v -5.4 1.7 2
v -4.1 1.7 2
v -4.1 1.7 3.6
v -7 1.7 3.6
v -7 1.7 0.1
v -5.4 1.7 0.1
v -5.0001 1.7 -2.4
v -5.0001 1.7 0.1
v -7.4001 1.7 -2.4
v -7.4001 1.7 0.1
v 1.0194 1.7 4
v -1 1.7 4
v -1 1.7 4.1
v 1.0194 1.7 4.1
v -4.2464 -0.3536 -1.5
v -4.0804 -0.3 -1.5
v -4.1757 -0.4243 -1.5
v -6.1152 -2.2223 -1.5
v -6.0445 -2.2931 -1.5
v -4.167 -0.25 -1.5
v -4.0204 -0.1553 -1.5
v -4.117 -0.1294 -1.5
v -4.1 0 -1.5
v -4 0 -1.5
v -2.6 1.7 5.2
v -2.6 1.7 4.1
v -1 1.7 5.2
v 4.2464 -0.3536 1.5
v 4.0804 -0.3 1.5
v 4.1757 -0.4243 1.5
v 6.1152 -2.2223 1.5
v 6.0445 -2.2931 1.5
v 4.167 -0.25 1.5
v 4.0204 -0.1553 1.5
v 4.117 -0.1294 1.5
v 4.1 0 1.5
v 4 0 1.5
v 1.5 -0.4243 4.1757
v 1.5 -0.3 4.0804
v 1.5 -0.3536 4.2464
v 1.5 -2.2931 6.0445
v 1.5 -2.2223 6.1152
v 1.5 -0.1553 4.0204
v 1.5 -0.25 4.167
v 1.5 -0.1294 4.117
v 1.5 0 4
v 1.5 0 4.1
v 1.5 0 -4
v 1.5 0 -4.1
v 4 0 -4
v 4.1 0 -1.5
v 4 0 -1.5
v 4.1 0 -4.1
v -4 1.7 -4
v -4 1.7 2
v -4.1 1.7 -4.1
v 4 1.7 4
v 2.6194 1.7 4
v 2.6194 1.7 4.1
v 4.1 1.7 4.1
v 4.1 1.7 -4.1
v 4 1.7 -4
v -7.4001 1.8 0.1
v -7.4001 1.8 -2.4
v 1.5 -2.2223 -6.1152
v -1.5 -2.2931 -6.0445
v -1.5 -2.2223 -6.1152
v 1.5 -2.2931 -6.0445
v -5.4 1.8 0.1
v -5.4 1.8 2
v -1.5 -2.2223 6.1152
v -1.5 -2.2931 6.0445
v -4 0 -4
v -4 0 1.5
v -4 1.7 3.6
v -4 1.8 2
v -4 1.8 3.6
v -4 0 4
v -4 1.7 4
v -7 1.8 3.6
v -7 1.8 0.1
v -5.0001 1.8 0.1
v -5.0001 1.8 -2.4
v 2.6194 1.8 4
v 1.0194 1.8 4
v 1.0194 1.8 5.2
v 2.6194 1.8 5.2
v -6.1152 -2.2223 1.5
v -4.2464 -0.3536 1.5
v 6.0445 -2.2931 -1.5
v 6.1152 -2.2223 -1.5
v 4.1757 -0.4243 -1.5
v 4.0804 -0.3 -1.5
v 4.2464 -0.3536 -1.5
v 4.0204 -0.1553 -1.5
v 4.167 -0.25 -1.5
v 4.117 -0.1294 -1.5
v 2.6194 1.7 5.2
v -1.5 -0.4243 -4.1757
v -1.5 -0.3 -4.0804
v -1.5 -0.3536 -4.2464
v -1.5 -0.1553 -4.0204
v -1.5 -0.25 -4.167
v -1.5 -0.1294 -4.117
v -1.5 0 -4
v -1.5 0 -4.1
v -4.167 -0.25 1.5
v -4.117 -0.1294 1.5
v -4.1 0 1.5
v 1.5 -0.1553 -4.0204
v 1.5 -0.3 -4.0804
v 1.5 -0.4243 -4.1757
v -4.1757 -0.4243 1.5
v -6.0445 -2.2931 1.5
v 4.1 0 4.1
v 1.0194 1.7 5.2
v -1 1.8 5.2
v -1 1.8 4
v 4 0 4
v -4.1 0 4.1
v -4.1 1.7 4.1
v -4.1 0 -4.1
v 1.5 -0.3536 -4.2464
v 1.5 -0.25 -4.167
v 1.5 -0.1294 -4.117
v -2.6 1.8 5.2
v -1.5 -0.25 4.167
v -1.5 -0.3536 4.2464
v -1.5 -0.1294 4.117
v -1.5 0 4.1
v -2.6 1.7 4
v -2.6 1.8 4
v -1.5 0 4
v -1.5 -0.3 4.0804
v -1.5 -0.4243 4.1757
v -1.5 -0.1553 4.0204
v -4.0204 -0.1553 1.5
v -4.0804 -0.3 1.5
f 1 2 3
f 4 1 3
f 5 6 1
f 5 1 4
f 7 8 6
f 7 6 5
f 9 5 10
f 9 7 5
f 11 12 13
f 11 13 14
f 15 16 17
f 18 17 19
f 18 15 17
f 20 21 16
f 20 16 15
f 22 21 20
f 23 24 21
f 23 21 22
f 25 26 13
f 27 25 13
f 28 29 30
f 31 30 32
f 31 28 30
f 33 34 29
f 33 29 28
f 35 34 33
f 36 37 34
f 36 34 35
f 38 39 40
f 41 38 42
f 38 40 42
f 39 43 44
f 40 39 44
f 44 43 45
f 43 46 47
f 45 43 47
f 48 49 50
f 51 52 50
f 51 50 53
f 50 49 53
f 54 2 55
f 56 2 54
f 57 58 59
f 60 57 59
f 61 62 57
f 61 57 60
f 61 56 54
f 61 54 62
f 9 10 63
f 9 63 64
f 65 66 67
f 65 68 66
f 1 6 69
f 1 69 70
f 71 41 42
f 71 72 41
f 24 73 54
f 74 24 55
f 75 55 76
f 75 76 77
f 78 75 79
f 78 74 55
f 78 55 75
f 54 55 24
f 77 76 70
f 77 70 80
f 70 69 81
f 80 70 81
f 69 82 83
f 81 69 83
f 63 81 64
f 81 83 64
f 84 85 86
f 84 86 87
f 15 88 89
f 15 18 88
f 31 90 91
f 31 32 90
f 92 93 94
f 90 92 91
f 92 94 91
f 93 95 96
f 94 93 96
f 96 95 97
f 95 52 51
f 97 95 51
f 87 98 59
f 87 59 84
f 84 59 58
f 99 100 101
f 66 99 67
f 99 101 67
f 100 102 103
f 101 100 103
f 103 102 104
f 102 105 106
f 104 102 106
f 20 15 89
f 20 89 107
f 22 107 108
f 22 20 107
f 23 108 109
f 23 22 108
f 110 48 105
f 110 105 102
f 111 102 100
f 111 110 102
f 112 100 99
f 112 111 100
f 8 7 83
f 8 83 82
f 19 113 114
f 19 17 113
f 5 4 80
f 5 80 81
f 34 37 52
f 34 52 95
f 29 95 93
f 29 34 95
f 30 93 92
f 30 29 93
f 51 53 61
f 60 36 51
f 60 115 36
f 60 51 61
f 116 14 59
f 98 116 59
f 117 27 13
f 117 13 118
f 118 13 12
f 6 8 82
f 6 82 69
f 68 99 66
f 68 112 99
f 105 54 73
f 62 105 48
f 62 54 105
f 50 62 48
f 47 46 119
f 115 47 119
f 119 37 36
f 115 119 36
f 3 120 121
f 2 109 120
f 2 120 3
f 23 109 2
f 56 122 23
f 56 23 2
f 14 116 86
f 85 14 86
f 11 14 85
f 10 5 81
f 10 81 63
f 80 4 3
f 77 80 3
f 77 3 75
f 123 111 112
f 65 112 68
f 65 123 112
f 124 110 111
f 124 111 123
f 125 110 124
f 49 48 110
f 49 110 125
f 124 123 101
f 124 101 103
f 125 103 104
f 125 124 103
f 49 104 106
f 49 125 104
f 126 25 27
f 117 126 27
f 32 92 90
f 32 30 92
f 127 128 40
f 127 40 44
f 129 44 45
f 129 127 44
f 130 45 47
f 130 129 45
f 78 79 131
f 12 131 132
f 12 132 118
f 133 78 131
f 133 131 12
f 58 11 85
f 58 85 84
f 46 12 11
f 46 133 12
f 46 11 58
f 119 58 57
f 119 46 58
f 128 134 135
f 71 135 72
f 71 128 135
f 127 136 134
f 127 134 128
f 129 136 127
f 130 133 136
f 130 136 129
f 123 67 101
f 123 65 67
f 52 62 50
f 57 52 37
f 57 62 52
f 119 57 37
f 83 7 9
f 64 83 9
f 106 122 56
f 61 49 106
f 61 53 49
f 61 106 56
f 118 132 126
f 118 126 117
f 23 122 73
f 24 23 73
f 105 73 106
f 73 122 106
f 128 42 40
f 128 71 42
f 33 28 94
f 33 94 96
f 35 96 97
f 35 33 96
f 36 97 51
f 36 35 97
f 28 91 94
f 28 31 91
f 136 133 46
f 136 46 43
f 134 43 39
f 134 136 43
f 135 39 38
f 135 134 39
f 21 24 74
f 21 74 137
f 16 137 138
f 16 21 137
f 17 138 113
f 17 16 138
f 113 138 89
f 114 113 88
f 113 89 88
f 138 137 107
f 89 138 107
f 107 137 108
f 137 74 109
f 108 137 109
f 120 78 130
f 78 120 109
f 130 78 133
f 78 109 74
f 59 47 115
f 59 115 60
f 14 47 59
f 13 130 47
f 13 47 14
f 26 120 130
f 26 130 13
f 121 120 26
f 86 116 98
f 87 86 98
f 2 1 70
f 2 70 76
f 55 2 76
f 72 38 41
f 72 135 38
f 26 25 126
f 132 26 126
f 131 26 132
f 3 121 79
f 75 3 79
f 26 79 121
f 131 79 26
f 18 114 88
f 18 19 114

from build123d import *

# Parameters (mm, degrees)
SKETCH1_W           = 8.2
SKETCH1_H           = 8.2
SKETCH1_W_2         = 8
SKETCH1_H_2         = 8
BOSS_EXTRUDE1_DEPTH = 1.7
BOSS_EXTRUDE2_DEPTH = 1.5
CIRPATTERN1_COUNT   = 4
BOSS_EXTRUDE3_DEPTH = 0.1
SKETCH4_W           = 1.6
SKETCH4_H           = 1.2
BOSS_EXTRUDE4_DEPTH = 0.1


with BuildPart() as part:
    # Sketch1 → Boss-Extrude1 (new body)
    with BuildSketch(Plane(origin=(0, 0, 0), x_dir=(1, 0, 0), z_dir=(0, 1, 0))):
        Rectangle(SKETCH1_W, SKETCH1_H)
        Rectangle(SKETCH1_W_2, SKETCH1_H_2, mode=Mode.SUBTRACT)
    extrude(amount=BOSS_EXTRUDE1_DEPTH)

    # Sketch2 → Boss-Extrude2 (add, symmetric)
    with BuildSketch(Plane.ZY):
        with BuildLine():
            Line((6.115237938, -2.222344719), (4.246446609, -0.353553391))
            ThreePointArc((4.246446609, -0.353553391), (4.138060234, -0.191341716), (4.1, 0))
            Line((4.1, 0), (4.1, 0.022895615))
            Line((4.1, 0.022895615), (4, 0.022895615))
            Line((4, 0.022895615), (4, 0))
            ThreePointArc((4, 0), (4.04567228, -0.229610059), (4.175735931, -0.424264069))
            Line((4.175735931, -0.424264069), (6.04452726, -2.293055398))
            Line((6.04452726, -2.293055398), (6.115237938, -2.222344719))
        make_face()
    boss_extrude2 = extrude(amount=BOSS_EXTRUDE2_DEPTH, both=True)

    # CirPattern1: Boss-Extrude2 ×4 about axis
    cirpattern1_axis = Axis((0, 0, 0), (0, 1, 0))
    for i in range(1, CIRPATTERN1_COUNT):
        add(boss_extrude2.rotate(cirpattern1_axis, i * 360 / CIRPATTERN1_COUNT))

    # Sketch3 → Boss-Extrude3 (add)
    with BuildSketch(Plane(origin=(0, 1.7, 0), x_dir=(1, 0, 0), z_dir=(0, 1, 0))):
        Polygon((-4, -3.6), (-5.4, -3.6), (-7, -3.6), (-7, -0.1), (-7.400115841, -0.1), (-7.400115841, 2.4), (-7, 2.4), (-5.4, 2.4), (-5.000115841, 2.4), (-5.000115841, -0.1), (-5.4, -0.1), (-5.4, -2), (-4, -2), align=None)
    extrude(amount=BOSS_EXTRUDE3_DEPTH)

    # Sketch4 → Boss-Extrude4 (add)
    with BuildSketch(Plane(origin=(0, 1.7, 0), x_dir=(1, 0, 0), z_dir=(0, 1, 0))):
        with Locations((-1.8, -4.6)):
            Rectangle(SKETCH4_W, SKETCH4_H)
        with Locations((1.819415949, -4.6)):
            Rectangle(SKETCH4_W, SKETCH4_H)
    extrude(amount=BOSS_EXTRUDE4_DEPTH)


solid = part.part
